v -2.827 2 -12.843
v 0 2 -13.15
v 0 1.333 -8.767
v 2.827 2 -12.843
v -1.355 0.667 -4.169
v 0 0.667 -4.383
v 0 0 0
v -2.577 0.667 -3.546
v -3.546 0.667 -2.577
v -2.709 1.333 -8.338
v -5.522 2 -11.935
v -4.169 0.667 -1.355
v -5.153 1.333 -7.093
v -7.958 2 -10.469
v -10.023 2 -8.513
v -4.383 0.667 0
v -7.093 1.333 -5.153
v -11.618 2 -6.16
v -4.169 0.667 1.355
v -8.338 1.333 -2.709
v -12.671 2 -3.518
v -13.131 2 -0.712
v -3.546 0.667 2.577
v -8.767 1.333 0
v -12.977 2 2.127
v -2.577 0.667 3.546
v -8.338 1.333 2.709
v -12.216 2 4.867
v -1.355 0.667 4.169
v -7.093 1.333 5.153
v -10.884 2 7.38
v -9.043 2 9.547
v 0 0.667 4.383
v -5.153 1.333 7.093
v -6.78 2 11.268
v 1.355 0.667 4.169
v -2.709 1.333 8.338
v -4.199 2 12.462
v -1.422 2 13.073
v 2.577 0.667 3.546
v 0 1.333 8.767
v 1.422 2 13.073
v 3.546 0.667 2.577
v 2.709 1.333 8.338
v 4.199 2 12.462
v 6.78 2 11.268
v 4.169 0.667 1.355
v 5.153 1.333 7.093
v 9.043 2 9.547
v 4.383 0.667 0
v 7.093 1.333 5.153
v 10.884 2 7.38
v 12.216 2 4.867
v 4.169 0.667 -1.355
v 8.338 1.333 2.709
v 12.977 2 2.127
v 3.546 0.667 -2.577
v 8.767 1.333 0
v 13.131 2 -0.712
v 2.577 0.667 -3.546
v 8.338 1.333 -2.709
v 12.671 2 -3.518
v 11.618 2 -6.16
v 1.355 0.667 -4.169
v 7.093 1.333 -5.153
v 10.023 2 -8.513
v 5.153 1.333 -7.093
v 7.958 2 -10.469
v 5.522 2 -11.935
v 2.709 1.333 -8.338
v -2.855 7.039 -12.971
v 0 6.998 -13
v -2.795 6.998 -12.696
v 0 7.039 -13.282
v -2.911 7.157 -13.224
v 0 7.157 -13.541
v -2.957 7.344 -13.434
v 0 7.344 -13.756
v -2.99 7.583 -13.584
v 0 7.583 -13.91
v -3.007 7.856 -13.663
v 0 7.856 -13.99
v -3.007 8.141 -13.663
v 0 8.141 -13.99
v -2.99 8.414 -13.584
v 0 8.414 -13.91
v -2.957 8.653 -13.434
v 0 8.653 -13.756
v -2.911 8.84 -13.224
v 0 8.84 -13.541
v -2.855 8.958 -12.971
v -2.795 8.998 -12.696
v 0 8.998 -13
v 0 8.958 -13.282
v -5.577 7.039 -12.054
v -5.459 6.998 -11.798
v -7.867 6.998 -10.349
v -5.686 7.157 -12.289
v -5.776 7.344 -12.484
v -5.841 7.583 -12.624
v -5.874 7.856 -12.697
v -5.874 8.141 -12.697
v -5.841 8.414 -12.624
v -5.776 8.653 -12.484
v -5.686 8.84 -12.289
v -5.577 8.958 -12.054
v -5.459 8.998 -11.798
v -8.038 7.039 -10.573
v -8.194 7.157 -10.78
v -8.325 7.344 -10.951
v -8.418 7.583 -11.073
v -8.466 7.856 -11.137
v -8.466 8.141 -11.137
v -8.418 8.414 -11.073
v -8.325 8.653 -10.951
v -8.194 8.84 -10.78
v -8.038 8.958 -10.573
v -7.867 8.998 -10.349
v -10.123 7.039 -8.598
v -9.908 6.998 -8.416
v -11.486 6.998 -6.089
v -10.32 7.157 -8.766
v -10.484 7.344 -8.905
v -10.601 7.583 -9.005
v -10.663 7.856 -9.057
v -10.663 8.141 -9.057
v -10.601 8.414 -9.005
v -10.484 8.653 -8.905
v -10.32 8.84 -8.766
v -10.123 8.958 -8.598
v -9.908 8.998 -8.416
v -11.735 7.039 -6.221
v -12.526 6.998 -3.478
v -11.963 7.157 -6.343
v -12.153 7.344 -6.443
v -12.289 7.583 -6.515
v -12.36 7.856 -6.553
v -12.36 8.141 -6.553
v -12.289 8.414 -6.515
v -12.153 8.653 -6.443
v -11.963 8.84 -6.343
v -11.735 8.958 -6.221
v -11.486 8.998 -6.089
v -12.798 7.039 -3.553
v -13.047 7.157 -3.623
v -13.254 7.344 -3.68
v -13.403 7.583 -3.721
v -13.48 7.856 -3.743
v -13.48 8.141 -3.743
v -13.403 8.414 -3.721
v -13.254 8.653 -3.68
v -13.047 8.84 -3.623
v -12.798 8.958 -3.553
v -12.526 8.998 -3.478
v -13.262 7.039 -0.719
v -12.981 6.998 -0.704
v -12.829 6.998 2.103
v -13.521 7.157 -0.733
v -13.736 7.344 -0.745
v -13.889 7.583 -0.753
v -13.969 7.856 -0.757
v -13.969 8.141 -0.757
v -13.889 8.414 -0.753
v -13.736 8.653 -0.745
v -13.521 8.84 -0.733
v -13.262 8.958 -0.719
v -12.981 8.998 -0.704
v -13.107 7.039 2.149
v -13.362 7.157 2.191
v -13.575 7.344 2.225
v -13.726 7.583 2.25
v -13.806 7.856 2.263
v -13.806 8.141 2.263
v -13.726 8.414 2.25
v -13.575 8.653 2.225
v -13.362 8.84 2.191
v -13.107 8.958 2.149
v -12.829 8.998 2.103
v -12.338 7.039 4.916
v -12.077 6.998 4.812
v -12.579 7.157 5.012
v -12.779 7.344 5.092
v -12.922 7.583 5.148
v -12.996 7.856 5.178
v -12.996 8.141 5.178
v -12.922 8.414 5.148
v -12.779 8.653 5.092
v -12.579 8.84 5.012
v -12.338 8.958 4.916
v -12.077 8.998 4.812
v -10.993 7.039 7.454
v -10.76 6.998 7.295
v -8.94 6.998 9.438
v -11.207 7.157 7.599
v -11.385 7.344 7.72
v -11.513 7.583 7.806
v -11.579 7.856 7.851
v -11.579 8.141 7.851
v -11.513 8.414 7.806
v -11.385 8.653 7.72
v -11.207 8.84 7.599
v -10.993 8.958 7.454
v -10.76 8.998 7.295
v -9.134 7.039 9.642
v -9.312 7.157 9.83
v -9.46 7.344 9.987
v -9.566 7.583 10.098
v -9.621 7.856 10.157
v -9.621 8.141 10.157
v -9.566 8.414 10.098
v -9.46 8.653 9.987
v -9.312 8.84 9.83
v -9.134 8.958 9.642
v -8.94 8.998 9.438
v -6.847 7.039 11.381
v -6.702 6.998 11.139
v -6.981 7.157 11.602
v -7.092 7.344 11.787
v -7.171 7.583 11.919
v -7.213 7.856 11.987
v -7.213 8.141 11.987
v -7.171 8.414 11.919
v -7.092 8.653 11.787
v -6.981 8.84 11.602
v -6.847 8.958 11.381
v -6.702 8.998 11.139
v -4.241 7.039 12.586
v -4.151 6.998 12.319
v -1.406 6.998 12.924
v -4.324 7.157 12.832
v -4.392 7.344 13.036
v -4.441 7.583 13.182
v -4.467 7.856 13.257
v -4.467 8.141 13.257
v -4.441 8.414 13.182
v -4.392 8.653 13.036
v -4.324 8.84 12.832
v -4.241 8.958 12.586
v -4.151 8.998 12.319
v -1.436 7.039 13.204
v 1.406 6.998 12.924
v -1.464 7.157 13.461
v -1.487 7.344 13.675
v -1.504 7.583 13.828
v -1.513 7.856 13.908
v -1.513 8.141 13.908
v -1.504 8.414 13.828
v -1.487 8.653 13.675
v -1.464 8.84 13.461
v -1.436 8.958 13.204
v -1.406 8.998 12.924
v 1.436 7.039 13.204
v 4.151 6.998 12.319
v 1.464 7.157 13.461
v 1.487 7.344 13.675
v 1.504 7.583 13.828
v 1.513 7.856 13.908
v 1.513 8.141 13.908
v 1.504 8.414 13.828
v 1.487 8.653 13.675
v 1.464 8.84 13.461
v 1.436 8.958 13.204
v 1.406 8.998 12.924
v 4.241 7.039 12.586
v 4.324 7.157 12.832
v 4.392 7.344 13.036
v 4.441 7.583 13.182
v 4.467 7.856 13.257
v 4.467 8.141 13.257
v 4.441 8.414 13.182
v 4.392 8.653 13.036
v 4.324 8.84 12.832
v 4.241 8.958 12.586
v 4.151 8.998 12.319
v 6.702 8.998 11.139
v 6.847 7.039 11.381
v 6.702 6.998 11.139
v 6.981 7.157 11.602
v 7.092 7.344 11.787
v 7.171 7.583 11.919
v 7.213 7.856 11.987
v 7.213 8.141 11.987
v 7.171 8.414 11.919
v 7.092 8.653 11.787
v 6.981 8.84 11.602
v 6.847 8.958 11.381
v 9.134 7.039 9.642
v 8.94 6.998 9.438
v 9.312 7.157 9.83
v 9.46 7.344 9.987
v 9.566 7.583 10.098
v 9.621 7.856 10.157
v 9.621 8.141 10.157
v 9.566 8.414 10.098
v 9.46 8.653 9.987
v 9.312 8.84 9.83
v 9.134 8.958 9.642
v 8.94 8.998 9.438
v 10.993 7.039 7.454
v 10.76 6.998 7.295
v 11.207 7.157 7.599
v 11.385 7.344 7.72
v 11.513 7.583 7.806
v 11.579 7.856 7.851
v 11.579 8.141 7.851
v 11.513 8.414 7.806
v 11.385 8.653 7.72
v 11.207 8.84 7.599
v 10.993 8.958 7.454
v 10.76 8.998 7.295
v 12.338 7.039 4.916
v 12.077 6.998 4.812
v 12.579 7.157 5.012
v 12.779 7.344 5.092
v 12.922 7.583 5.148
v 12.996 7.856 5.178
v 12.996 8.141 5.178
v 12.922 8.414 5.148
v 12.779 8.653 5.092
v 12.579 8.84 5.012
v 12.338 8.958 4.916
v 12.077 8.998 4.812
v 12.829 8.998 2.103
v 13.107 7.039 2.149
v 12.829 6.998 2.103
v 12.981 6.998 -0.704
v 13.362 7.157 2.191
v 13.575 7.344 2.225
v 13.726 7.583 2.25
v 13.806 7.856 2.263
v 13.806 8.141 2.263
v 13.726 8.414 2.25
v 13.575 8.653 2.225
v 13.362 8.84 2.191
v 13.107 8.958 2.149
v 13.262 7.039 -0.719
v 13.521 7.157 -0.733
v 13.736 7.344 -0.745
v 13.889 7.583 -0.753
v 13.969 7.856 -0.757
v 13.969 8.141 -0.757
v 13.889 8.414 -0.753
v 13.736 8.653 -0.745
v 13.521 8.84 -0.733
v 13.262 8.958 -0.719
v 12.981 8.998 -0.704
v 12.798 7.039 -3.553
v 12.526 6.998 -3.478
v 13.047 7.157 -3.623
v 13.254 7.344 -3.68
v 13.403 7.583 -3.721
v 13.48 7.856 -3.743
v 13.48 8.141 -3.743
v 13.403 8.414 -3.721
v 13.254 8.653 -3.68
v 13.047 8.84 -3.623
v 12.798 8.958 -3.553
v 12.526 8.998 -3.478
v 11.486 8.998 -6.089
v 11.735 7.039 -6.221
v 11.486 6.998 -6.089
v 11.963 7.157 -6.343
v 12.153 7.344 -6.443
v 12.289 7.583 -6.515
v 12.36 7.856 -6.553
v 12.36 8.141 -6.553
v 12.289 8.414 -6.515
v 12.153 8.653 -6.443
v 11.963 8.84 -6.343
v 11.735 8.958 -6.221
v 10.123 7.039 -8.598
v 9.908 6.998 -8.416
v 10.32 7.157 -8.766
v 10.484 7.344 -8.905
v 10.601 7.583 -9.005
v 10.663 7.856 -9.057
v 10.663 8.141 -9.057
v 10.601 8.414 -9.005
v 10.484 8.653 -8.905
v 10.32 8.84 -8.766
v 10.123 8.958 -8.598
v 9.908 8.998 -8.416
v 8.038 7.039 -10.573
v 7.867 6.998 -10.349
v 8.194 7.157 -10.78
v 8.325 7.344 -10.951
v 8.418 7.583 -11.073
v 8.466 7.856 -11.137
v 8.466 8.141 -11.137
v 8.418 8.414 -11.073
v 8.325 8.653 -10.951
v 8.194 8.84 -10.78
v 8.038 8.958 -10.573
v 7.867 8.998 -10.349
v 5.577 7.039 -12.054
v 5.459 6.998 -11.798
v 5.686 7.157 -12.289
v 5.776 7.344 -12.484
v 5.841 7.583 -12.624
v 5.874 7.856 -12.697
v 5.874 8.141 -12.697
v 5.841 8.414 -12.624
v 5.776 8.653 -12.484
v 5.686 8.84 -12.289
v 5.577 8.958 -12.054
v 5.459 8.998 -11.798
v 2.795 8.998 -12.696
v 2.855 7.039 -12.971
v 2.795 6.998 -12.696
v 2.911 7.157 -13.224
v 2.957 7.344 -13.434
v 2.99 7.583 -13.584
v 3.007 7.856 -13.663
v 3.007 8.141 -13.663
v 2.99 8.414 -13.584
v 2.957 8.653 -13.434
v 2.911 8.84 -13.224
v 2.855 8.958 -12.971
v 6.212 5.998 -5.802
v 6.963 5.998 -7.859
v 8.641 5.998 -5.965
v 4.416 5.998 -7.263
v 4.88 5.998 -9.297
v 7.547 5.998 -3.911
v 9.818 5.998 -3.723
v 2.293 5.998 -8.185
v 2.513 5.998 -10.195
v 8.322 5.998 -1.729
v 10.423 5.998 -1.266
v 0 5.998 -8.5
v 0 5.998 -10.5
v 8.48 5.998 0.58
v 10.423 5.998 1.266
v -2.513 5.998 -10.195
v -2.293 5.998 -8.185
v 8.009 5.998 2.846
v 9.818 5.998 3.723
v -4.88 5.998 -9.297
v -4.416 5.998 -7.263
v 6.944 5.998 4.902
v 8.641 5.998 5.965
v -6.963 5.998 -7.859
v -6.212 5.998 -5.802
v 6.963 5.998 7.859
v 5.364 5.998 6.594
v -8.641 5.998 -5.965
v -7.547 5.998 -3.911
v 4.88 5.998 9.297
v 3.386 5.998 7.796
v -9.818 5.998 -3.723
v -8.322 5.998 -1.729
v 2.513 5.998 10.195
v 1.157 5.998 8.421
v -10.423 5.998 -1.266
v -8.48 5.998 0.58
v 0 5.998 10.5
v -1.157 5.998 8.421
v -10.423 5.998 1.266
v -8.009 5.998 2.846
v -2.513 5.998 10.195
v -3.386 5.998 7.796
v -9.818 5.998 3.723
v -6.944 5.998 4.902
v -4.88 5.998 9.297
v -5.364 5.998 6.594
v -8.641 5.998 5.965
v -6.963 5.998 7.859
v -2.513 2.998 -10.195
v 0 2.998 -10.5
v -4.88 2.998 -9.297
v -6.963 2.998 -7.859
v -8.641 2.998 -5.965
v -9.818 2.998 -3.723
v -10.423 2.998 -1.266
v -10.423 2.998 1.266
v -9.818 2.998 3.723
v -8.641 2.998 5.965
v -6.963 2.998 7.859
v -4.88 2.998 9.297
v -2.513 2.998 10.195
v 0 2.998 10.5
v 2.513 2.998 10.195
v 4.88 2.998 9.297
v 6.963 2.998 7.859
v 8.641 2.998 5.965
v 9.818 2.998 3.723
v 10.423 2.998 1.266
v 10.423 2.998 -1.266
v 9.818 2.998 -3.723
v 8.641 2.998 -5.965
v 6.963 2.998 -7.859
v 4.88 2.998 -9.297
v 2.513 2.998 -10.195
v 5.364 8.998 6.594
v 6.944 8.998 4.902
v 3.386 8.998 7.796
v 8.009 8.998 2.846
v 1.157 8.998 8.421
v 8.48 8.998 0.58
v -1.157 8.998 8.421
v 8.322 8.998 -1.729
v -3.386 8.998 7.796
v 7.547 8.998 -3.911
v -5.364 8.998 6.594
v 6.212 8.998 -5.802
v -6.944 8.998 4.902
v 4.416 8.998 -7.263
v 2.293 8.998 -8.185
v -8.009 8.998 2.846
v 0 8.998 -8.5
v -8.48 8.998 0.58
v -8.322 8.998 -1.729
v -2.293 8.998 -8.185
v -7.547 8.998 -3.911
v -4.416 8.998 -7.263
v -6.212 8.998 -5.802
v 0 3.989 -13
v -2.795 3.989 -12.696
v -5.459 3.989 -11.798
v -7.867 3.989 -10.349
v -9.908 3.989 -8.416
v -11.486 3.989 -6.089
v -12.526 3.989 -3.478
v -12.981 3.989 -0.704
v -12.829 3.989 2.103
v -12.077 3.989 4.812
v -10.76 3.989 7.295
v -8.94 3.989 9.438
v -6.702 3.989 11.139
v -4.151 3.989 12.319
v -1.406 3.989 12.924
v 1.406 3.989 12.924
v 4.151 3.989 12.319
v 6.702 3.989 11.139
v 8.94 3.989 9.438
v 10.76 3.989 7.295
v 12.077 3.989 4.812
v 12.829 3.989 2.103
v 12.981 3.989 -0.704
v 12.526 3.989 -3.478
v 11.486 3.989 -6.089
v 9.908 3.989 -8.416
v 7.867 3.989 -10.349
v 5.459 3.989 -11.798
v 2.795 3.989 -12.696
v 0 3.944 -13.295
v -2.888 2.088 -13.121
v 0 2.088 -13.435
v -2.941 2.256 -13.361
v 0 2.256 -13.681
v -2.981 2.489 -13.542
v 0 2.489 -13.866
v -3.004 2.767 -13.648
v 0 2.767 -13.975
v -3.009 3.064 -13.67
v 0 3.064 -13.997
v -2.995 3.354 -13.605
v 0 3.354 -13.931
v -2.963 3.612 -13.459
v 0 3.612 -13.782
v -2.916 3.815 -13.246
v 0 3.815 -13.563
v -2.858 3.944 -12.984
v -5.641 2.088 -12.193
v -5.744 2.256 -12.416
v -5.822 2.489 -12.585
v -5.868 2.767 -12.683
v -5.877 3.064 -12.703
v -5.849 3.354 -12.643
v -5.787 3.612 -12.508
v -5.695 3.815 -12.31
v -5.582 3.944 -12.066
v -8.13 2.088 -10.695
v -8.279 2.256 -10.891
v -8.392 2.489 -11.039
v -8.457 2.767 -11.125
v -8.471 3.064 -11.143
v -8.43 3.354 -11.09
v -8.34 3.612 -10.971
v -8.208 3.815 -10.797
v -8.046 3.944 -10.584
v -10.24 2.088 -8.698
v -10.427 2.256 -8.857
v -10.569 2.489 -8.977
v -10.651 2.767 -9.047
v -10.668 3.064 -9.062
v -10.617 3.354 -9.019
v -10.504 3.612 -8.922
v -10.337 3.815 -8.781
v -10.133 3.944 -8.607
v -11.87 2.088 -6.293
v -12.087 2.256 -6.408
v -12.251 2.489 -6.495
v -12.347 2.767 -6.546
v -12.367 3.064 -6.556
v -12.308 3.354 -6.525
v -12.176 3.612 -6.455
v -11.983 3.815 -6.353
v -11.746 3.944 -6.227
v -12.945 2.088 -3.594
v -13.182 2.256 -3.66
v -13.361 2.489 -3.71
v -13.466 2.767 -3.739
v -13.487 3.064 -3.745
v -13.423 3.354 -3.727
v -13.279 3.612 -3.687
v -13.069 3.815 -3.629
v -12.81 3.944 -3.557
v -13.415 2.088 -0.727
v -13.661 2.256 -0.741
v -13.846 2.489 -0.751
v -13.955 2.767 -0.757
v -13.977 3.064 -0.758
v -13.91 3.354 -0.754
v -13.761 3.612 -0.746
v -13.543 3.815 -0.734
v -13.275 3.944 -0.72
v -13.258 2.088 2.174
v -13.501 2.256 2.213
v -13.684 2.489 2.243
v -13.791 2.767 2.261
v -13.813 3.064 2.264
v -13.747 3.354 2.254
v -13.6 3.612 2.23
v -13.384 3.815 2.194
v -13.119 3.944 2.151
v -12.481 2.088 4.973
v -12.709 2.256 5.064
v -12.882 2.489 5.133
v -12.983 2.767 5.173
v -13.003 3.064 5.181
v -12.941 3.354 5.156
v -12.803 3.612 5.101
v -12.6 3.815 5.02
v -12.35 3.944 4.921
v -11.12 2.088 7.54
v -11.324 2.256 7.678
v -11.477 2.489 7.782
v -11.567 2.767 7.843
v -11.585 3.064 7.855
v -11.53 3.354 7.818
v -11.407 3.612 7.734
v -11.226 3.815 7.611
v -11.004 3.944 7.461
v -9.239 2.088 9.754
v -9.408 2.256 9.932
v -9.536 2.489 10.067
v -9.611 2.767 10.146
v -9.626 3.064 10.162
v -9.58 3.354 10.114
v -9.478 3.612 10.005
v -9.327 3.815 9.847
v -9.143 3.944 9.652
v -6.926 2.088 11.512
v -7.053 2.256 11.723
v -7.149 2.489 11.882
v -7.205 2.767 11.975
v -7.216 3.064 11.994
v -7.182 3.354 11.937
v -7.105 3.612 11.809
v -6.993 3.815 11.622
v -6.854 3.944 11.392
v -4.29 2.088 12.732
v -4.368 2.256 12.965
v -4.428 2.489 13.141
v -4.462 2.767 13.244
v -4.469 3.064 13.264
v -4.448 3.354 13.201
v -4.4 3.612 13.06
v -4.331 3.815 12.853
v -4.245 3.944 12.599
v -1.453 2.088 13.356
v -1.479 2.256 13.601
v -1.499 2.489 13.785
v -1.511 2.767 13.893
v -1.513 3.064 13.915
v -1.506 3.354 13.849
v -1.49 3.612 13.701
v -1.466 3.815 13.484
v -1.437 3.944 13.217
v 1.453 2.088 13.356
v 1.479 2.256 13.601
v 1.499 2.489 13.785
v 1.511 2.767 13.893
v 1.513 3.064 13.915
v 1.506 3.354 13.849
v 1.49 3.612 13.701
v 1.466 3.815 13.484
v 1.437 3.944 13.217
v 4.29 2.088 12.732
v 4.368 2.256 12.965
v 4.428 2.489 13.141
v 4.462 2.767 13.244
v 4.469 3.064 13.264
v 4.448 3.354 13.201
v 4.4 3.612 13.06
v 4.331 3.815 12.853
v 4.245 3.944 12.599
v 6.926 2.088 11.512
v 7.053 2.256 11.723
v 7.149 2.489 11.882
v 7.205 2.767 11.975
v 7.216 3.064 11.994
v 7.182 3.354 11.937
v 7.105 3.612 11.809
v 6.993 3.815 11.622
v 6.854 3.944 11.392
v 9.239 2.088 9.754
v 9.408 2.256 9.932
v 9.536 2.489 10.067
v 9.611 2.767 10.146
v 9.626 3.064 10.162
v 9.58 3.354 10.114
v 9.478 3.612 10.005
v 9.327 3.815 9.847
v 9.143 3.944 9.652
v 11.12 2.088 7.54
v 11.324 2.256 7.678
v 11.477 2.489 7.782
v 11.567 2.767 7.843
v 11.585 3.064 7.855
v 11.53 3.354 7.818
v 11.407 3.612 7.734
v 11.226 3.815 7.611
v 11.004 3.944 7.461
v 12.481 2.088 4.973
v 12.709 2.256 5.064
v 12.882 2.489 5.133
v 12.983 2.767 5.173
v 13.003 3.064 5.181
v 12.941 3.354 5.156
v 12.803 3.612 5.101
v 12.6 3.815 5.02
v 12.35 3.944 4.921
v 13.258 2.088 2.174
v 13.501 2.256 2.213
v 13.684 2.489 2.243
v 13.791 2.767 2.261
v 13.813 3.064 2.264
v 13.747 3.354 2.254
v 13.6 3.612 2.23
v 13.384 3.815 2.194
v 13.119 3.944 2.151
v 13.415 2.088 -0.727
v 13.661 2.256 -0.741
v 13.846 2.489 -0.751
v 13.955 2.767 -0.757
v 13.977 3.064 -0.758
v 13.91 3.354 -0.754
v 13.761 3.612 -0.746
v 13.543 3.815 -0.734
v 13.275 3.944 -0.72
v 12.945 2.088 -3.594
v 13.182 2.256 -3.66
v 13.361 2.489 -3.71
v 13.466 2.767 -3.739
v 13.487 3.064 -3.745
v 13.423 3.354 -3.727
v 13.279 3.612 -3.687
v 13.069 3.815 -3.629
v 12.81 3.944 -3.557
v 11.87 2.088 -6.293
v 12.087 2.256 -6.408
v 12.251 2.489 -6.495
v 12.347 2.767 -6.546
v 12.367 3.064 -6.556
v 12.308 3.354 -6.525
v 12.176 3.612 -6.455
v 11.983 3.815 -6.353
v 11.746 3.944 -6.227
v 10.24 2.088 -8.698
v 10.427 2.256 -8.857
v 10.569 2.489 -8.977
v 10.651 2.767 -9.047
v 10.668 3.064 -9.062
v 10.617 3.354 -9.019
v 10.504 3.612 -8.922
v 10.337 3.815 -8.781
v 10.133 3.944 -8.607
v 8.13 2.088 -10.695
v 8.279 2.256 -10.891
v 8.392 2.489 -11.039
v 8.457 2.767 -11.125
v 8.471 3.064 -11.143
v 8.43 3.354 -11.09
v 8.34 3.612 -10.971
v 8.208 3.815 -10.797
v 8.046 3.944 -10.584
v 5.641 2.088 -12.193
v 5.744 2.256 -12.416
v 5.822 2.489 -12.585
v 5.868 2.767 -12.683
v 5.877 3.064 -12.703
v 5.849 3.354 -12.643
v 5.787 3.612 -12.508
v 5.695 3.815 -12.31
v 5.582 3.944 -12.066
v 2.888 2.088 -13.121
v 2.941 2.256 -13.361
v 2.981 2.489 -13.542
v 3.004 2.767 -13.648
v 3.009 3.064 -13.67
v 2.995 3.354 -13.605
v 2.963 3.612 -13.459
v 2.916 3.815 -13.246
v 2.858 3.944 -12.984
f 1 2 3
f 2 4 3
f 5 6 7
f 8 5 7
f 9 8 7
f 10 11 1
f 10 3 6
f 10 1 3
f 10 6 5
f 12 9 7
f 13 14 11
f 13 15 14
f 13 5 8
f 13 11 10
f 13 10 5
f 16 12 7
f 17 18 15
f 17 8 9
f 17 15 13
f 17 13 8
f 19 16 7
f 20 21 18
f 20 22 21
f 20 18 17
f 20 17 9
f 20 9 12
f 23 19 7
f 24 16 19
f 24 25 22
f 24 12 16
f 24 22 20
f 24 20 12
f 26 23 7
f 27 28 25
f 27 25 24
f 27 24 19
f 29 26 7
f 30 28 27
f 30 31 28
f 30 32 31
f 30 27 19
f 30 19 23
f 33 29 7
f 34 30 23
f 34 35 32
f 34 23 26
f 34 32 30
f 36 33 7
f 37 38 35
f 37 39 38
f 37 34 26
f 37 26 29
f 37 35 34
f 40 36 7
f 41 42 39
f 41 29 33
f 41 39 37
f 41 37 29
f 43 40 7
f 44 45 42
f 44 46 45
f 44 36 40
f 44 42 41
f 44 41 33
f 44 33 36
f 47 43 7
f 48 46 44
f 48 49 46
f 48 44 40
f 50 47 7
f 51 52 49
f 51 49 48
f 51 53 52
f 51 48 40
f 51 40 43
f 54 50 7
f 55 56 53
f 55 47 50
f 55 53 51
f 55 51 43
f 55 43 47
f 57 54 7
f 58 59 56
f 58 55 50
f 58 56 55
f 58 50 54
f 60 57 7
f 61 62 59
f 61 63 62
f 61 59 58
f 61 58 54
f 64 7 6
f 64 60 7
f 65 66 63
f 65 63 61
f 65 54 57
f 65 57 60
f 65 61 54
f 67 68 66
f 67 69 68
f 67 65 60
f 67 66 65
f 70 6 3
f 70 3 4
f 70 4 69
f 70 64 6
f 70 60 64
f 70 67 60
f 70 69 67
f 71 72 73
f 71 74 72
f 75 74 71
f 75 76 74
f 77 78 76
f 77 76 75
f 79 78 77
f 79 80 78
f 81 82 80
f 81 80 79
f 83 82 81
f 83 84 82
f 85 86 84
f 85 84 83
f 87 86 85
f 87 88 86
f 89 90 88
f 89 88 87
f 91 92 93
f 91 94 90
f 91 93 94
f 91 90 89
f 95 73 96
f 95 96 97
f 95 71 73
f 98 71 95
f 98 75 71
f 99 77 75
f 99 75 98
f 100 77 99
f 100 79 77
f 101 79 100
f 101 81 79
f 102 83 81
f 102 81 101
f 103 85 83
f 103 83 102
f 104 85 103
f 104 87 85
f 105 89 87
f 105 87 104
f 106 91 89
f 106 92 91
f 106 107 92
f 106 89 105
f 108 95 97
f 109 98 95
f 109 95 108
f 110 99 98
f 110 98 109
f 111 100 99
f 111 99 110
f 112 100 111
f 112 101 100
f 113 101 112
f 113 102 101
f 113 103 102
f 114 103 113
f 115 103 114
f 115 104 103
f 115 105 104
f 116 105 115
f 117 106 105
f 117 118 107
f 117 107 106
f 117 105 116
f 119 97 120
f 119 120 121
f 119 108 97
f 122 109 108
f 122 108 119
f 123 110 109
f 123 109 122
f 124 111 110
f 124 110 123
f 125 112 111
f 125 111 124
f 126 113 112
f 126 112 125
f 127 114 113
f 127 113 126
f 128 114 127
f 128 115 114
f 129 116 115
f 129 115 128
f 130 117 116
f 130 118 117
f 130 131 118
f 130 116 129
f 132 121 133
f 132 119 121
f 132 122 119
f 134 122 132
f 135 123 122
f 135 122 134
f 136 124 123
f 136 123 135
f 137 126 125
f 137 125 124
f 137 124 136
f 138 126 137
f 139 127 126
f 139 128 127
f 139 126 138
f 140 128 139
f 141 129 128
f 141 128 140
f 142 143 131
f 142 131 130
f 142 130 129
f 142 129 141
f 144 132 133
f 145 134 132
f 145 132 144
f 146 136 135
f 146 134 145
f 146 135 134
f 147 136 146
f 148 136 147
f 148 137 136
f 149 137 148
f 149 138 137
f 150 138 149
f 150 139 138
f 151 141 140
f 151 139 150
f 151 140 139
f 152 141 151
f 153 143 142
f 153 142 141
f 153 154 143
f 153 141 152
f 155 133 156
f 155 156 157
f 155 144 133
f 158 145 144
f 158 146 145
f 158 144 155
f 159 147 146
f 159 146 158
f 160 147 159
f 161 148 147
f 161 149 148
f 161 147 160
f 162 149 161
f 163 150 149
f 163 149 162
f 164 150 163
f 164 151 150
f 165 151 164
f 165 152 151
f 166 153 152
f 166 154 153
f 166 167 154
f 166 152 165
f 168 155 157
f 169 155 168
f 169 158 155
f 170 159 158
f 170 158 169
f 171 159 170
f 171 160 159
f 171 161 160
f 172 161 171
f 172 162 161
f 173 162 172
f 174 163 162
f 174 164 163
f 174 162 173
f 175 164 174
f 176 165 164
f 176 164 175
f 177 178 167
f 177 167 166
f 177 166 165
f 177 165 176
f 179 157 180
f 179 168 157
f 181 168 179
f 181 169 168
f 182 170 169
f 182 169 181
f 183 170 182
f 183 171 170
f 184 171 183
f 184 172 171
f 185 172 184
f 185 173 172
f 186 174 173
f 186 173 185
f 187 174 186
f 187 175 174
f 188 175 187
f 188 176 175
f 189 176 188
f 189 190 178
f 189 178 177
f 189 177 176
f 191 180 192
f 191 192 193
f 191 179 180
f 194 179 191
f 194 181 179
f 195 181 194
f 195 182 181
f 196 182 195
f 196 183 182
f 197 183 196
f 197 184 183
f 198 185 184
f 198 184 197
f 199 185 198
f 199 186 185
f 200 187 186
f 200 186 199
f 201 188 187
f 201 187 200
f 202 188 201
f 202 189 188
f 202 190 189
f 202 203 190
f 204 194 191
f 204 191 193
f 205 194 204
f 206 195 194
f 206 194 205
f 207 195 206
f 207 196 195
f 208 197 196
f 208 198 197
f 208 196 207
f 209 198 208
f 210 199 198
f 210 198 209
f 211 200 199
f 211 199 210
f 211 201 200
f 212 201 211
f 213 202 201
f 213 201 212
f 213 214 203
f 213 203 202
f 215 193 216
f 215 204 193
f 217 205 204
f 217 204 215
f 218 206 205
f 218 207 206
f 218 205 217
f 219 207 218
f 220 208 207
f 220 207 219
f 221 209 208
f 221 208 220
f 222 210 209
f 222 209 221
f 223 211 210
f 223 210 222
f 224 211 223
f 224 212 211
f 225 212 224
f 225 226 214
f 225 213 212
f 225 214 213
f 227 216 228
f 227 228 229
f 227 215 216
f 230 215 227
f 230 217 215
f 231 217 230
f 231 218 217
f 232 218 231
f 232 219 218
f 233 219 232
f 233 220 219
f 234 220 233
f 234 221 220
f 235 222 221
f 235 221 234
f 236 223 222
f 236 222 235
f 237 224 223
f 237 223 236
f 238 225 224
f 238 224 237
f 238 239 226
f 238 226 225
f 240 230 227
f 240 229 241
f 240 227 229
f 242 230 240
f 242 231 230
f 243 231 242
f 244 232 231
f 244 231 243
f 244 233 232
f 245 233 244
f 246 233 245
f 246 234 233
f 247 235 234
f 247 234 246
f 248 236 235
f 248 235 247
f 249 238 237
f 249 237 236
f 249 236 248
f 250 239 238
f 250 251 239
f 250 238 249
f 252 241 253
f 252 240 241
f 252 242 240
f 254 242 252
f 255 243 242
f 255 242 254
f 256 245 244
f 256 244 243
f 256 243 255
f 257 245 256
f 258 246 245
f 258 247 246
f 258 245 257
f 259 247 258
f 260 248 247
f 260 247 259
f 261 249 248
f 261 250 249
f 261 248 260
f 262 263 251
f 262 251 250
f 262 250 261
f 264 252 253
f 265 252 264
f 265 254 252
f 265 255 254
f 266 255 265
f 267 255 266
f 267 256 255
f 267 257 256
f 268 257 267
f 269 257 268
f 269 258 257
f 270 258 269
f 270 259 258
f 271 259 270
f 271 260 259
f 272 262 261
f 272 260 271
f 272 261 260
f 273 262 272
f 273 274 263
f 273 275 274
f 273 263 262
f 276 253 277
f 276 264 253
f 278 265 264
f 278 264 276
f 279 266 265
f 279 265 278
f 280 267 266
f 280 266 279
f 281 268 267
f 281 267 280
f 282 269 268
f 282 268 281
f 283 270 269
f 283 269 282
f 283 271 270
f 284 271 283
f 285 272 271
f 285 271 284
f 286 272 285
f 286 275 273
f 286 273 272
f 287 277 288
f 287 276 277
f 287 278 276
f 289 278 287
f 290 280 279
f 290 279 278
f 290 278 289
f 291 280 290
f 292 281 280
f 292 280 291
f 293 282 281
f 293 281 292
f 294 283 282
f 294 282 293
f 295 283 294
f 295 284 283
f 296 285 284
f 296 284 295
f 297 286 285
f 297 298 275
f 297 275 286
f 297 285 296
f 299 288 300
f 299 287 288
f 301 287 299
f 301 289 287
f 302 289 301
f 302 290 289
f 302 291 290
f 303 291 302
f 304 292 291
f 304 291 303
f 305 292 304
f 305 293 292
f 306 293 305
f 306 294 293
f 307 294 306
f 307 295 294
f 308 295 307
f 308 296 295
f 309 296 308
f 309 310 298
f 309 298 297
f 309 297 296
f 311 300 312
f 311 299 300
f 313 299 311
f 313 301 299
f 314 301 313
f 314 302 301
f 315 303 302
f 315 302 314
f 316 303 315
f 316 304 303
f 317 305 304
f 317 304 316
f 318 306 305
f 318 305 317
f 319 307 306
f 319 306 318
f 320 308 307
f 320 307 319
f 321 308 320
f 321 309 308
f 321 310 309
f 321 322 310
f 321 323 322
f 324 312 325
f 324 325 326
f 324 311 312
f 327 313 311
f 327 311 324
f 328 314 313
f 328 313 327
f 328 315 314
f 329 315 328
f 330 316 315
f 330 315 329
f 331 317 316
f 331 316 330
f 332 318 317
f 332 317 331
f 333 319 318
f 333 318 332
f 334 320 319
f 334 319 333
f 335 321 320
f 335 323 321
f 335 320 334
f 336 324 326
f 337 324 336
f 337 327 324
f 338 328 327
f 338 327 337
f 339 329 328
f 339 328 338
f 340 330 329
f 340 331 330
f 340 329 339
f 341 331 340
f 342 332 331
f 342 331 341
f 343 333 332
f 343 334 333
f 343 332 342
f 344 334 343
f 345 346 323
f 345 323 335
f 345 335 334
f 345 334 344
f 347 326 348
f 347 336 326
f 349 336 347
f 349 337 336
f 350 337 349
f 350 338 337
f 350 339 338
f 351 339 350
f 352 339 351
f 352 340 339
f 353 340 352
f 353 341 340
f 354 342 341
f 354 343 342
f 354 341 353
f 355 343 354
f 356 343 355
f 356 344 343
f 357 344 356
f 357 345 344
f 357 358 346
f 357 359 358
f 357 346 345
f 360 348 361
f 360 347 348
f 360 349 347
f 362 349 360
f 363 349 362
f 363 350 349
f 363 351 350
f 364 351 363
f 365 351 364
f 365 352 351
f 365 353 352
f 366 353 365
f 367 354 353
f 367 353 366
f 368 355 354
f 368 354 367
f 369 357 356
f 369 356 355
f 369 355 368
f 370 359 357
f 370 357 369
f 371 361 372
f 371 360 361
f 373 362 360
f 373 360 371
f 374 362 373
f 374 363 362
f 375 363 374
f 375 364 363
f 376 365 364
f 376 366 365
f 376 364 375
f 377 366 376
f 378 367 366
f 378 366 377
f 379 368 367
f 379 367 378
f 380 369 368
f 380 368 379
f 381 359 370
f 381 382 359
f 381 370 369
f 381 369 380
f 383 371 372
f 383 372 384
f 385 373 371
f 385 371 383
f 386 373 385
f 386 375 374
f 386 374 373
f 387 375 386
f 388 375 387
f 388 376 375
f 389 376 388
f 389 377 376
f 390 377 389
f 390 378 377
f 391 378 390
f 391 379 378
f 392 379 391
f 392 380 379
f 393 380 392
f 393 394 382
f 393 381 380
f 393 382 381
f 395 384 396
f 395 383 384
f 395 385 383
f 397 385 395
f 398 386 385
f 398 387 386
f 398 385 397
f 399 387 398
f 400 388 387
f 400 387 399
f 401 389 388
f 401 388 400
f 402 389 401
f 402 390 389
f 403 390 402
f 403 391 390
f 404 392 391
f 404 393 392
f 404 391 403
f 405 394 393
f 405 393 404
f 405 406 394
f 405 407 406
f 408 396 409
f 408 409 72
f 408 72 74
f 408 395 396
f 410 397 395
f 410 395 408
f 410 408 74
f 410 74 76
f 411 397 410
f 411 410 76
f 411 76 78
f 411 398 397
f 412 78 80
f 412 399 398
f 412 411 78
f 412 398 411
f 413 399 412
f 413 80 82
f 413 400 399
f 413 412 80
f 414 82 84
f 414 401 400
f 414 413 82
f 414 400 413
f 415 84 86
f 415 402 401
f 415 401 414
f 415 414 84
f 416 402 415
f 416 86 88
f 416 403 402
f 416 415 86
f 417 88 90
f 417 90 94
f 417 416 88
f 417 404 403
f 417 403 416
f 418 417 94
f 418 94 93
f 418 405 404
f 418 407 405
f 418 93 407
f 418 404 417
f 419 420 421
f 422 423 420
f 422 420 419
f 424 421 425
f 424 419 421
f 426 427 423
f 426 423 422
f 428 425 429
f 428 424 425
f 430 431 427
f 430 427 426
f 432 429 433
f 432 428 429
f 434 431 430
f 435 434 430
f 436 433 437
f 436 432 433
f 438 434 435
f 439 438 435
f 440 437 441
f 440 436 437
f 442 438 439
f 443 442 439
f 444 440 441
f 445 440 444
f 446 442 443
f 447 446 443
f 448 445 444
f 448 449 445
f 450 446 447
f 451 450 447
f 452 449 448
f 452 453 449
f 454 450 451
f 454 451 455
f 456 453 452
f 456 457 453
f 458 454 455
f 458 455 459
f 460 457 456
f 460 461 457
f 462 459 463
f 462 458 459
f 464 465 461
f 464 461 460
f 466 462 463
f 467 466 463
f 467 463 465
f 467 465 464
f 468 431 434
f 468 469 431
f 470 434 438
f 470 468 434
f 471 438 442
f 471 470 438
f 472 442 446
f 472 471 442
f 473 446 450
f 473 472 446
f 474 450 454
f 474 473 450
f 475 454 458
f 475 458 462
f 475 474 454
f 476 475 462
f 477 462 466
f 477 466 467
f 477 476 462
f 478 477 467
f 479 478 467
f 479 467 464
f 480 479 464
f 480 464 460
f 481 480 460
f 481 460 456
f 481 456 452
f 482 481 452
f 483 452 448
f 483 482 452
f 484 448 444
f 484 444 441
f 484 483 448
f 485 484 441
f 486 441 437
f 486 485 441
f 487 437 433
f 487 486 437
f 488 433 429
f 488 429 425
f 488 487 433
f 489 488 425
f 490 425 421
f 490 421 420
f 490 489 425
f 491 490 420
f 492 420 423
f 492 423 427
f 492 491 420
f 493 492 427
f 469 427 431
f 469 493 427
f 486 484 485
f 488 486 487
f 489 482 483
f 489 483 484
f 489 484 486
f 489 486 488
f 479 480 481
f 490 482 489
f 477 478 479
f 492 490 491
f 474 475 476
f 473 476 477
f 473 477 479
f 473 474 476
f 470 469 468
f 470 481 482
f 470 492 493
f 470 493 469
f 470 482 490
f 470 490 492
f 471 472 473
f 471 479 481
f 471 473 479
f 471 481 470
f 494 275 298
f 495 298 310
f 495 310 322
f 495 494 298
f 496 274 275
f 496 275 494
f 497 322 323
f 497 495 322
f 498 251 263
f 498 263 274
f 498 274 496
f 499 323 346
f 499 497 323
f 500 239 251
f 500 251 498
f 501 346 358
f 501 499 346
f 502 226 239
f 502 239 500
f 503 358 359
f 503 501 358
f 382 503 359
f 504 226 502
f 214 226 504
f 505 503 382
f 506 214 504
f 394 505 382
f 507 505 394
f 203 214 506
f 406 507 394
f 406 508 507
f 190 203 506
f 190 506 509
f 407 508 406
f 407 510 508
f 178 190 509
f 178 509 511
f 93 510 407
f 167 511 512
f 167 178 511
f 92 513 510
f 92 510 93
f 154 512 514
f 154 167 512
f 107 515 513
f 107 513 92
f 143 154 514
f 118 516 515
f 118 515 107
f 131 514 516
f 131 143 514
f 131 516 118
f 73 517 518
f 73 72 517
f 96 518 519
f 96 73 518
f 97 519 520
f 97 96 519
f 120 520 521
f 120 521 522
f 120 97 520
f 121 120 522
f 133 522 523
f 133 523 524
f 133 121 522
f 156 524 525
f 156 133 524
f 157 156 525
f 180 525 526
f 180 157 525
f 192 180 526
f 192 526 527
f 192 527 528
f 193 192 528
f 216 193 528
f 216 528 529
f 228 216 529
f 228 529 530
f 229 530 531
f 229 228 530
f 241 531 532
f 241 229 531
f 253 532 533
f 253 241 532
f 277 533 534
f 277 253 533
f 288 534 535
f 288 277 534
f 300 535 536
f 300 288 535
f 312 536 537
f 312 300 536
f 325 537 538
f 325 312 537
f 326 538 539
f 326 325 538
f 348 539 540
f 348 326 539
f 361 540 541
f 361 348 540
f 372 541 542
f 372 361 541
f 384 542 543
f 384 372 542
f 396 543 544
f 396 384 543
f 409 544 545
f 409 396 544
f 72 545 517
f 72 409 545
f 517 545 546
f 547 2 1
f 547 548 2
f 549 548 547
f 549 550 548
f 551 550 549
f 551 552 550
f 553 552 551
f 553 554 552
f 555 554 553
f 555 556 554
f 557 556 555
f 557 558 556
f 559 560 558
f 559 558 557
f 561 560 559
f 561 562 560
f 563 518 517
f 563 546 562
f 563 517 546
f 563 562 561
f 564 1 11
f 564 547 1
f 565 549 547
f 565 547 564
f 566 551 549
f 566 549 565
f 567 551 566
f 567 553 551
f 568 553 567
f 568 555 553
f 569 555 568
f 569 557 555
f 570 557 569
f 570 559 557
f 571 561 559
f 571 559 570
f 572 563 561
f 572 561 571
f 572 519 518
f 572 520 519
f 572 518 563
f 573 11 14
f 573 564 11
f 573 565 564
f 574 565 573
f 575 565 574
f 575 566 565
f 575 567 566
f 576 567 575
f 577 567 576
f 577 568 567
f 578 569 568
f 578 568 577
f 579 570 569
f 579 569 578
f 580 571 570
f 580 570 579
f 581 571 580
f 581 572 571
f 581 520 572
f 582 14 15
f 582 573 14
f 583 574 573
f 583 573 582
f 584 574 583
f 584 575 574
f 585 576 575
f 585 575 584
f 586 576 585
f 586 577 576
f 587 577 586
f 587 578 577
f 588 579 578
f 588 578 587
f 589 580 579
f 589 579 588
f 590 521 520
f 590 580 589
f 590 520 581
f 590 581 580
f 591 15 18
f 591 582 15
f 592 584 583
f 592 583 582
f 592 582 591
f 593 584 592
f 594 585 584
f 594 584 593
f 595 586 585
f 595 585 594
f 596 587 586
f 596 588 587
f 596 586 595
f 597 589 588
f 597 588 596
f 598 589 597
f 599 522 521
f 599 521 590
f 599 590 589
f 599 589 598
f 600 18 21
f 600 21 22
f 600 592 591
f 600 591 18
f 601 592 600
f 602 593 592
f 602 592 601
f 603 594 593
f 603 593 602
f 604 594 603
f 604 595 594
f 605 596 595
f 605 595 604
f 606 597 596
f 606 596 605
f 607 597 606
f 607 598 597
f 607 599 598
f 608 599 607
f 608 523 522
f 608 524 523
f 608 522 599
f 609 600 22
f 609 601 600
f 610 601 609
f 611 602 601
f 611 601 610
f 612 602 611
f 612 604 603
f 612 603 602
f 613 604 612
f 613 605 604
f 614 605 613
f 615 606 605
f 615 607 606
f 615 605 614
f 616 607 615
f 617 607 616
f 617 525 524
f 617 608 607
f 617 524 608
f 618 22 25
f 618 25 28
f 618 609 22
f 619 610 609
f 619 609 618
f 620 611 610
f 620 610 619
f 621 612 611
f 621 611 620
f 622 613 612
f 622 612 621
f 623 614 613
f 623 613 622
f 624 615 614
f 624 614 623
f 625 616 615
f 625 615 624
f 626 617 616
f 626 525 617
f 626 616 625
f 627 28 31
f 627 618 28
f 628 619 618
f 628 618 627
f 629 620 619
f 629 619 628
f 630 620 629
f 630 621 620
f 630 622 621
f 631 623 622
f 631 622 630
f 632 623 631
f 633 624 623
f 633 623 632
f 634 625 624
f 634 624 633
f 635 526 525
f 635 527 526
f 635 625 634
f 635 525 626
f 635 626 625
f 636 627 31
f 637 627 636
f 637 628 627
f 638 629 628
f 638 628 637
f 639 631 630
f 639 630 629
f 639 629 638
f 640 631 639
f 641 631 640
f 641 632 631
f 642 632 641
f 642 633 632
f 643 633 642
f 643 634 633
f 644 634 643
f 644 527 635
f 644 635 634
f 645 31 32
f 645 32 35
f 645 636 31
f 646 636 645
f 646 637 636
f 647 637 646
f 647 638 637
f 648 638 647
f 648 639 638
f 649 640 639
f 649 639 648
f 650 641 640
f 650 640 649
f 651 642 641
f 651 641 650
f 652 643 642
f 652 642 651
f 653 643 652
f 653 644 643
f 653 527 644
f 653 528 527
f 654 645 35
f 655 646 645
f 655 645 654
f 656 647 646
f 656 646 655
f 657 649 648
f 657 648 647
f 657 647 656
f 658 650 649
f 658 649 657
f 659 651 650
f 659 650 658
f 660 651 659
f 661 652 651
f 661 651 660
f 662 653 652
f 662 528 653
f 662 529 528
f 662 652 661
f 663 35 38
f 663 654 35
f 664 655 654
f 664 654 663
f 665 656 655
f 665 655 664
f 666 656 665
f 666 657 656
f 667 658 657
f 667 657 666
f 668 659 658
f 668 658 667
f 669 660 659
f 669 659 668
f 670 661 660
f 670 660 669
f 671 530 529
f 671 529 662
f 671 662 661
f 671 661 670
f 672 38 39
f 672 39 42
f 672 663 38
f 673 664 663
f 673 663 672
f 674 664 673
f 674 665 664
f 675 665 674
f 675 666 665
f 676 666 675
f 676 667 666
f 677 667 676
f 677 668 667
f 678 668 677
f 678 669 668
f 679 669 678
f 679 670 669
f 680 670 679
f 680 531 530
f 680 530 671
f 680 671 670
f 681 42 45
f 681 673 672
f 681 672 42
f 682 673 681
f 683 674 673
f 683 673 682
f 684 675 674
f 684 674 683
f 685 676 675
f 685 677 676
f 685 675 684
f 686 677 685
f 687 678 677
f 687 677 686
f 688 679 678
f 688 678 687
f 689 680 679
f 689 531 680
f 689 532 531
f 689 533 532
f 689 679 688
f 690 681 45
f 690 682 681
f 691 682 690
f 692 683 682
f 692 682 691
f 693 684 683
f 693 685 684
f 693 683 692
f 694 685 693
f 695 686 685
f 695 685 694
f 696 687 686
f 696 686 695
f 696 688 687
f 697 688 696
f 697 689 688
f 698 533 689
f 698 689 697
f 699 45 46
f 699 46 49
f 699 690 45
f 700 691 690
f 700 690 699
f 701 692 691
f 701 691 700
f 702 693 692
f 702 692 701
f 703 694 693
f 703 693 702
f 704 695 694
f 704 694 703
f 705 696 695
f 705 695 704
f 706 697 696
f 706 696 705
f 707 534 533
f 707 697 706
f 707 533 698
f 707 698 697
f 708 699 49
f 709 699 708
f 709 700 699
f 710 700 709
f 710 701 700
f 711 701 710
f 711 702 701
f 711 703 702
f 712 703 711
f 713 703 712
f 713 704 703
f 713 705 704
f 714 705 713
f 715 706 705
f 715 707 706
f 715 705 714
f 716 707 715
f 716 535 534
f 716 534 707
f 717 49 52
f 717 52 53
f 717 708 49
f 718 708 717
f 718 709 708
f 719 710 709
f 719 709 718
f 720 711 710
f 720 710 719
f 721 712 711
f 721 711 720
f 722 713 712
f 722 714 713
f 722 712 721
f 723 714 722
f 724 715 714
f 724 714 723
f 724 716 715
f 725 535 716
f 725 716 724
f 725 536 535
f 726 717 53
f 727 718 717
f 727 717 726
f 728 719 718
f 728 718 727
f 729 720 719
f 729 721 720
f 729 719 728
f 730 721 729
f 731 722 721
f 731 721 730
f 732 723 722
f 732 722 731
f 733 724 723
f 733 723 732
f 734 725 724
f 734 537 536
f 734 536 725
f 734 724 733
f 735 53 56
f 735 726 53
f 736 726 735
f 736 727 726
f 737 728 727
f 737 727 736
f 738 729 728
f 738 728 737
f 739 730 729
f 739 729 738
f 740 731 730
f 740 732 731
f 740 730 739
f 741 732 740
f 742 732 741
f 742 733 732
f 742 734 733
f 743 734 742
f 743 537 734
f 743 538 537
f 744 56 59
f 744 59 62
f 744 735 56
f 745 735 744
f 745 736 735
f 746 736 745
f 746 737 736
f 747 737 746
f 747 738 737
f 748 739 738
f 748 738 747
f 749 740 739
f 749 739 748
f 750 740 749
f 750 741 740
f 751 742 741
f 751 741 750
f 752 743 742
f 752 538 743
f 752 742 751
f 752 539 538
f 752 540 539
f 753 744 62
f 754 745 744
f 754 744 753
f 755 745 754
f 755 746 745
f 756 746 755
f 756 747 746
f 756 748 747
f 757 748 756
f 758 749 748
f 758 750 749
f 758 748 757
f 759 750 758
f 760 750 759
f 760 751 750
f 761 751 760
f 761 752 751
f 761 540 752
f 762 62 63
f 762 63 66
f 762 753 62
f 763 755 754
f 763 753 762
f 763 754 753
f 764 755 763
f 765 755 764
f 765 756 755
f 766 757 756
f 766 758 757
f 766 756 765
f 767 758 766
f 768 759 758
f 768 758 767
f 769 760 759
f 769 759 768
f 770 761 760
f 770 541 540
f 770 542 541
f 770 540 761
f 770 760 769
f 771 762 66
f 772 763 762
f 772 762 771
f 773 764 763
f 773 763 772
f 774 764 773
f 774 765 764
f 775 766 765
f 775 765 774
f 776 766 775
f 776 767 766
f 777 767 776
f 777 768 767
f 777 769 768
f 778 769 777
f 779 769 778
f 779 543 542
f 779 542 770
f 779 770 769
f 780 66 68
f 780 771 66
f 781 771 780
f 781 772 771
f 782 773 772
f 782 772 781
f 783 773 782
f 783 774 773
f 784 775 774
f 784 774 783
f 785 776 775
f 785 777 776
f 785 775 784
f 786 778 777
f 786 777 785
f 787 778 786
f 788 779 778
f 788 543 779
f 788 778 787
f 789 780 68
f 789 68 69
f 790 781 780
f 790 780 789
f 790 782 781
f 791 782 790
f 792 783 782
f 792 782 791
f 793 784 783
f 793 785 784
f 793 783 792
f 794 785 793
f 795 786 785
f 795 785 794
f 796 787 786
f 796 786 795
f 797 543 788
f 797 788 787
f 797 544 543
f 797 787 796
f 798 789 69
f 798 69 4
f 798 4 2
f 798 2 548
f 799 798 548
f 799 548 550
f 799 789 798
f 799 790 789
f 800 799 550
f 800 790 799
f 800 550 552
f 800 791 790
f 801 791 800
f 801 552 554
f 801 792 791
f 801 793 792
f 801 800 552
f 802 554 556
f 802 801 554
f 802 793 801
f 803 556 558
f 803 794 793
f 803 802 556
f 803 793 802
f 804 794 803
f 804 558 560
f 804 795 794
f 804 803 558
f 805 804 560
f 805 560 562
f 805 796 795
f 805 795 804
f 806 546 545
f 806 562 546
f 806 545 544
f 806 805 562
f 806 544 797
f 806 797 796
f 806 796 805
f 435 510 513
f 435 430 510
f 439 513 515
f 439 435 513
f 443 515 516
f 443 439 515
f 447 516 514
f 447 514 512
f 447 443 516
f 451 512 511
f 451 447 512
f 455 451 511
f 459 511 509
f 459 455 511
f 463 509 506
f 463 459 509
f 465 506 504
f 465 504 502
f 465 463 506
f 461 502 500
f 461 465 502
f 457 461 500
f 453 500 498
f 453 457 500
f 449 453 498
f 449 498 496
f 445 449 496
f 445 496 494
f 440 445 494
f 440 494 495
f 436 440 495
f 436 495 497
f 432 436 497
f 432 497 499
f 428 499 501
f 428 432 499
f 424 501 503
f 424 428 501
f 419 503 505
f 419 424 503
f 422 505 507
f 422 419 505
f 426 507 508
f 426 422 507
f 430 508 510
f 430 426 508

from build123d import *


with BuildPart() as part:
    # Skizze1 → Rotation1 (revolve)
    with BuildSketch(Plane.XY, mode=Mode.PRIVATE) as rotation1_sk:
        with BuildLine():
            Line((0, 0), (13.150358125, 2))
            ThreePointArc((13.150358125, 2), (13.997153849, 3.064025241), (13, 3.988631597))
            Line((13, 3.988631597), (13, 6.998384988))
            ThreePointArc((13, 6.998384988), (14, 7.998384988), (13, 8.998384988))
            Line((13, 8.998384988), (8.5, 8.998384988))
            Line((8.5, 8.998384988), (8.5, 5.998384988))
            Line((8.5, 5.998384988), (10.5, 5.998384988))
            Line((10.5, 5.998384988), (10.5, 2.998384988))
            Line((10.5, 2.998384988), (0, 2.998384988))
            Line((0, 2.998384988), (0, 0))
        make_face()
    revolve(rotation1_sk.sketch.rotate(Axis((0, 0, 0), (0, 1, 0)), 90), axis=Axis((0, 0, 0), (0, 1, 0)))


solid = part.part
